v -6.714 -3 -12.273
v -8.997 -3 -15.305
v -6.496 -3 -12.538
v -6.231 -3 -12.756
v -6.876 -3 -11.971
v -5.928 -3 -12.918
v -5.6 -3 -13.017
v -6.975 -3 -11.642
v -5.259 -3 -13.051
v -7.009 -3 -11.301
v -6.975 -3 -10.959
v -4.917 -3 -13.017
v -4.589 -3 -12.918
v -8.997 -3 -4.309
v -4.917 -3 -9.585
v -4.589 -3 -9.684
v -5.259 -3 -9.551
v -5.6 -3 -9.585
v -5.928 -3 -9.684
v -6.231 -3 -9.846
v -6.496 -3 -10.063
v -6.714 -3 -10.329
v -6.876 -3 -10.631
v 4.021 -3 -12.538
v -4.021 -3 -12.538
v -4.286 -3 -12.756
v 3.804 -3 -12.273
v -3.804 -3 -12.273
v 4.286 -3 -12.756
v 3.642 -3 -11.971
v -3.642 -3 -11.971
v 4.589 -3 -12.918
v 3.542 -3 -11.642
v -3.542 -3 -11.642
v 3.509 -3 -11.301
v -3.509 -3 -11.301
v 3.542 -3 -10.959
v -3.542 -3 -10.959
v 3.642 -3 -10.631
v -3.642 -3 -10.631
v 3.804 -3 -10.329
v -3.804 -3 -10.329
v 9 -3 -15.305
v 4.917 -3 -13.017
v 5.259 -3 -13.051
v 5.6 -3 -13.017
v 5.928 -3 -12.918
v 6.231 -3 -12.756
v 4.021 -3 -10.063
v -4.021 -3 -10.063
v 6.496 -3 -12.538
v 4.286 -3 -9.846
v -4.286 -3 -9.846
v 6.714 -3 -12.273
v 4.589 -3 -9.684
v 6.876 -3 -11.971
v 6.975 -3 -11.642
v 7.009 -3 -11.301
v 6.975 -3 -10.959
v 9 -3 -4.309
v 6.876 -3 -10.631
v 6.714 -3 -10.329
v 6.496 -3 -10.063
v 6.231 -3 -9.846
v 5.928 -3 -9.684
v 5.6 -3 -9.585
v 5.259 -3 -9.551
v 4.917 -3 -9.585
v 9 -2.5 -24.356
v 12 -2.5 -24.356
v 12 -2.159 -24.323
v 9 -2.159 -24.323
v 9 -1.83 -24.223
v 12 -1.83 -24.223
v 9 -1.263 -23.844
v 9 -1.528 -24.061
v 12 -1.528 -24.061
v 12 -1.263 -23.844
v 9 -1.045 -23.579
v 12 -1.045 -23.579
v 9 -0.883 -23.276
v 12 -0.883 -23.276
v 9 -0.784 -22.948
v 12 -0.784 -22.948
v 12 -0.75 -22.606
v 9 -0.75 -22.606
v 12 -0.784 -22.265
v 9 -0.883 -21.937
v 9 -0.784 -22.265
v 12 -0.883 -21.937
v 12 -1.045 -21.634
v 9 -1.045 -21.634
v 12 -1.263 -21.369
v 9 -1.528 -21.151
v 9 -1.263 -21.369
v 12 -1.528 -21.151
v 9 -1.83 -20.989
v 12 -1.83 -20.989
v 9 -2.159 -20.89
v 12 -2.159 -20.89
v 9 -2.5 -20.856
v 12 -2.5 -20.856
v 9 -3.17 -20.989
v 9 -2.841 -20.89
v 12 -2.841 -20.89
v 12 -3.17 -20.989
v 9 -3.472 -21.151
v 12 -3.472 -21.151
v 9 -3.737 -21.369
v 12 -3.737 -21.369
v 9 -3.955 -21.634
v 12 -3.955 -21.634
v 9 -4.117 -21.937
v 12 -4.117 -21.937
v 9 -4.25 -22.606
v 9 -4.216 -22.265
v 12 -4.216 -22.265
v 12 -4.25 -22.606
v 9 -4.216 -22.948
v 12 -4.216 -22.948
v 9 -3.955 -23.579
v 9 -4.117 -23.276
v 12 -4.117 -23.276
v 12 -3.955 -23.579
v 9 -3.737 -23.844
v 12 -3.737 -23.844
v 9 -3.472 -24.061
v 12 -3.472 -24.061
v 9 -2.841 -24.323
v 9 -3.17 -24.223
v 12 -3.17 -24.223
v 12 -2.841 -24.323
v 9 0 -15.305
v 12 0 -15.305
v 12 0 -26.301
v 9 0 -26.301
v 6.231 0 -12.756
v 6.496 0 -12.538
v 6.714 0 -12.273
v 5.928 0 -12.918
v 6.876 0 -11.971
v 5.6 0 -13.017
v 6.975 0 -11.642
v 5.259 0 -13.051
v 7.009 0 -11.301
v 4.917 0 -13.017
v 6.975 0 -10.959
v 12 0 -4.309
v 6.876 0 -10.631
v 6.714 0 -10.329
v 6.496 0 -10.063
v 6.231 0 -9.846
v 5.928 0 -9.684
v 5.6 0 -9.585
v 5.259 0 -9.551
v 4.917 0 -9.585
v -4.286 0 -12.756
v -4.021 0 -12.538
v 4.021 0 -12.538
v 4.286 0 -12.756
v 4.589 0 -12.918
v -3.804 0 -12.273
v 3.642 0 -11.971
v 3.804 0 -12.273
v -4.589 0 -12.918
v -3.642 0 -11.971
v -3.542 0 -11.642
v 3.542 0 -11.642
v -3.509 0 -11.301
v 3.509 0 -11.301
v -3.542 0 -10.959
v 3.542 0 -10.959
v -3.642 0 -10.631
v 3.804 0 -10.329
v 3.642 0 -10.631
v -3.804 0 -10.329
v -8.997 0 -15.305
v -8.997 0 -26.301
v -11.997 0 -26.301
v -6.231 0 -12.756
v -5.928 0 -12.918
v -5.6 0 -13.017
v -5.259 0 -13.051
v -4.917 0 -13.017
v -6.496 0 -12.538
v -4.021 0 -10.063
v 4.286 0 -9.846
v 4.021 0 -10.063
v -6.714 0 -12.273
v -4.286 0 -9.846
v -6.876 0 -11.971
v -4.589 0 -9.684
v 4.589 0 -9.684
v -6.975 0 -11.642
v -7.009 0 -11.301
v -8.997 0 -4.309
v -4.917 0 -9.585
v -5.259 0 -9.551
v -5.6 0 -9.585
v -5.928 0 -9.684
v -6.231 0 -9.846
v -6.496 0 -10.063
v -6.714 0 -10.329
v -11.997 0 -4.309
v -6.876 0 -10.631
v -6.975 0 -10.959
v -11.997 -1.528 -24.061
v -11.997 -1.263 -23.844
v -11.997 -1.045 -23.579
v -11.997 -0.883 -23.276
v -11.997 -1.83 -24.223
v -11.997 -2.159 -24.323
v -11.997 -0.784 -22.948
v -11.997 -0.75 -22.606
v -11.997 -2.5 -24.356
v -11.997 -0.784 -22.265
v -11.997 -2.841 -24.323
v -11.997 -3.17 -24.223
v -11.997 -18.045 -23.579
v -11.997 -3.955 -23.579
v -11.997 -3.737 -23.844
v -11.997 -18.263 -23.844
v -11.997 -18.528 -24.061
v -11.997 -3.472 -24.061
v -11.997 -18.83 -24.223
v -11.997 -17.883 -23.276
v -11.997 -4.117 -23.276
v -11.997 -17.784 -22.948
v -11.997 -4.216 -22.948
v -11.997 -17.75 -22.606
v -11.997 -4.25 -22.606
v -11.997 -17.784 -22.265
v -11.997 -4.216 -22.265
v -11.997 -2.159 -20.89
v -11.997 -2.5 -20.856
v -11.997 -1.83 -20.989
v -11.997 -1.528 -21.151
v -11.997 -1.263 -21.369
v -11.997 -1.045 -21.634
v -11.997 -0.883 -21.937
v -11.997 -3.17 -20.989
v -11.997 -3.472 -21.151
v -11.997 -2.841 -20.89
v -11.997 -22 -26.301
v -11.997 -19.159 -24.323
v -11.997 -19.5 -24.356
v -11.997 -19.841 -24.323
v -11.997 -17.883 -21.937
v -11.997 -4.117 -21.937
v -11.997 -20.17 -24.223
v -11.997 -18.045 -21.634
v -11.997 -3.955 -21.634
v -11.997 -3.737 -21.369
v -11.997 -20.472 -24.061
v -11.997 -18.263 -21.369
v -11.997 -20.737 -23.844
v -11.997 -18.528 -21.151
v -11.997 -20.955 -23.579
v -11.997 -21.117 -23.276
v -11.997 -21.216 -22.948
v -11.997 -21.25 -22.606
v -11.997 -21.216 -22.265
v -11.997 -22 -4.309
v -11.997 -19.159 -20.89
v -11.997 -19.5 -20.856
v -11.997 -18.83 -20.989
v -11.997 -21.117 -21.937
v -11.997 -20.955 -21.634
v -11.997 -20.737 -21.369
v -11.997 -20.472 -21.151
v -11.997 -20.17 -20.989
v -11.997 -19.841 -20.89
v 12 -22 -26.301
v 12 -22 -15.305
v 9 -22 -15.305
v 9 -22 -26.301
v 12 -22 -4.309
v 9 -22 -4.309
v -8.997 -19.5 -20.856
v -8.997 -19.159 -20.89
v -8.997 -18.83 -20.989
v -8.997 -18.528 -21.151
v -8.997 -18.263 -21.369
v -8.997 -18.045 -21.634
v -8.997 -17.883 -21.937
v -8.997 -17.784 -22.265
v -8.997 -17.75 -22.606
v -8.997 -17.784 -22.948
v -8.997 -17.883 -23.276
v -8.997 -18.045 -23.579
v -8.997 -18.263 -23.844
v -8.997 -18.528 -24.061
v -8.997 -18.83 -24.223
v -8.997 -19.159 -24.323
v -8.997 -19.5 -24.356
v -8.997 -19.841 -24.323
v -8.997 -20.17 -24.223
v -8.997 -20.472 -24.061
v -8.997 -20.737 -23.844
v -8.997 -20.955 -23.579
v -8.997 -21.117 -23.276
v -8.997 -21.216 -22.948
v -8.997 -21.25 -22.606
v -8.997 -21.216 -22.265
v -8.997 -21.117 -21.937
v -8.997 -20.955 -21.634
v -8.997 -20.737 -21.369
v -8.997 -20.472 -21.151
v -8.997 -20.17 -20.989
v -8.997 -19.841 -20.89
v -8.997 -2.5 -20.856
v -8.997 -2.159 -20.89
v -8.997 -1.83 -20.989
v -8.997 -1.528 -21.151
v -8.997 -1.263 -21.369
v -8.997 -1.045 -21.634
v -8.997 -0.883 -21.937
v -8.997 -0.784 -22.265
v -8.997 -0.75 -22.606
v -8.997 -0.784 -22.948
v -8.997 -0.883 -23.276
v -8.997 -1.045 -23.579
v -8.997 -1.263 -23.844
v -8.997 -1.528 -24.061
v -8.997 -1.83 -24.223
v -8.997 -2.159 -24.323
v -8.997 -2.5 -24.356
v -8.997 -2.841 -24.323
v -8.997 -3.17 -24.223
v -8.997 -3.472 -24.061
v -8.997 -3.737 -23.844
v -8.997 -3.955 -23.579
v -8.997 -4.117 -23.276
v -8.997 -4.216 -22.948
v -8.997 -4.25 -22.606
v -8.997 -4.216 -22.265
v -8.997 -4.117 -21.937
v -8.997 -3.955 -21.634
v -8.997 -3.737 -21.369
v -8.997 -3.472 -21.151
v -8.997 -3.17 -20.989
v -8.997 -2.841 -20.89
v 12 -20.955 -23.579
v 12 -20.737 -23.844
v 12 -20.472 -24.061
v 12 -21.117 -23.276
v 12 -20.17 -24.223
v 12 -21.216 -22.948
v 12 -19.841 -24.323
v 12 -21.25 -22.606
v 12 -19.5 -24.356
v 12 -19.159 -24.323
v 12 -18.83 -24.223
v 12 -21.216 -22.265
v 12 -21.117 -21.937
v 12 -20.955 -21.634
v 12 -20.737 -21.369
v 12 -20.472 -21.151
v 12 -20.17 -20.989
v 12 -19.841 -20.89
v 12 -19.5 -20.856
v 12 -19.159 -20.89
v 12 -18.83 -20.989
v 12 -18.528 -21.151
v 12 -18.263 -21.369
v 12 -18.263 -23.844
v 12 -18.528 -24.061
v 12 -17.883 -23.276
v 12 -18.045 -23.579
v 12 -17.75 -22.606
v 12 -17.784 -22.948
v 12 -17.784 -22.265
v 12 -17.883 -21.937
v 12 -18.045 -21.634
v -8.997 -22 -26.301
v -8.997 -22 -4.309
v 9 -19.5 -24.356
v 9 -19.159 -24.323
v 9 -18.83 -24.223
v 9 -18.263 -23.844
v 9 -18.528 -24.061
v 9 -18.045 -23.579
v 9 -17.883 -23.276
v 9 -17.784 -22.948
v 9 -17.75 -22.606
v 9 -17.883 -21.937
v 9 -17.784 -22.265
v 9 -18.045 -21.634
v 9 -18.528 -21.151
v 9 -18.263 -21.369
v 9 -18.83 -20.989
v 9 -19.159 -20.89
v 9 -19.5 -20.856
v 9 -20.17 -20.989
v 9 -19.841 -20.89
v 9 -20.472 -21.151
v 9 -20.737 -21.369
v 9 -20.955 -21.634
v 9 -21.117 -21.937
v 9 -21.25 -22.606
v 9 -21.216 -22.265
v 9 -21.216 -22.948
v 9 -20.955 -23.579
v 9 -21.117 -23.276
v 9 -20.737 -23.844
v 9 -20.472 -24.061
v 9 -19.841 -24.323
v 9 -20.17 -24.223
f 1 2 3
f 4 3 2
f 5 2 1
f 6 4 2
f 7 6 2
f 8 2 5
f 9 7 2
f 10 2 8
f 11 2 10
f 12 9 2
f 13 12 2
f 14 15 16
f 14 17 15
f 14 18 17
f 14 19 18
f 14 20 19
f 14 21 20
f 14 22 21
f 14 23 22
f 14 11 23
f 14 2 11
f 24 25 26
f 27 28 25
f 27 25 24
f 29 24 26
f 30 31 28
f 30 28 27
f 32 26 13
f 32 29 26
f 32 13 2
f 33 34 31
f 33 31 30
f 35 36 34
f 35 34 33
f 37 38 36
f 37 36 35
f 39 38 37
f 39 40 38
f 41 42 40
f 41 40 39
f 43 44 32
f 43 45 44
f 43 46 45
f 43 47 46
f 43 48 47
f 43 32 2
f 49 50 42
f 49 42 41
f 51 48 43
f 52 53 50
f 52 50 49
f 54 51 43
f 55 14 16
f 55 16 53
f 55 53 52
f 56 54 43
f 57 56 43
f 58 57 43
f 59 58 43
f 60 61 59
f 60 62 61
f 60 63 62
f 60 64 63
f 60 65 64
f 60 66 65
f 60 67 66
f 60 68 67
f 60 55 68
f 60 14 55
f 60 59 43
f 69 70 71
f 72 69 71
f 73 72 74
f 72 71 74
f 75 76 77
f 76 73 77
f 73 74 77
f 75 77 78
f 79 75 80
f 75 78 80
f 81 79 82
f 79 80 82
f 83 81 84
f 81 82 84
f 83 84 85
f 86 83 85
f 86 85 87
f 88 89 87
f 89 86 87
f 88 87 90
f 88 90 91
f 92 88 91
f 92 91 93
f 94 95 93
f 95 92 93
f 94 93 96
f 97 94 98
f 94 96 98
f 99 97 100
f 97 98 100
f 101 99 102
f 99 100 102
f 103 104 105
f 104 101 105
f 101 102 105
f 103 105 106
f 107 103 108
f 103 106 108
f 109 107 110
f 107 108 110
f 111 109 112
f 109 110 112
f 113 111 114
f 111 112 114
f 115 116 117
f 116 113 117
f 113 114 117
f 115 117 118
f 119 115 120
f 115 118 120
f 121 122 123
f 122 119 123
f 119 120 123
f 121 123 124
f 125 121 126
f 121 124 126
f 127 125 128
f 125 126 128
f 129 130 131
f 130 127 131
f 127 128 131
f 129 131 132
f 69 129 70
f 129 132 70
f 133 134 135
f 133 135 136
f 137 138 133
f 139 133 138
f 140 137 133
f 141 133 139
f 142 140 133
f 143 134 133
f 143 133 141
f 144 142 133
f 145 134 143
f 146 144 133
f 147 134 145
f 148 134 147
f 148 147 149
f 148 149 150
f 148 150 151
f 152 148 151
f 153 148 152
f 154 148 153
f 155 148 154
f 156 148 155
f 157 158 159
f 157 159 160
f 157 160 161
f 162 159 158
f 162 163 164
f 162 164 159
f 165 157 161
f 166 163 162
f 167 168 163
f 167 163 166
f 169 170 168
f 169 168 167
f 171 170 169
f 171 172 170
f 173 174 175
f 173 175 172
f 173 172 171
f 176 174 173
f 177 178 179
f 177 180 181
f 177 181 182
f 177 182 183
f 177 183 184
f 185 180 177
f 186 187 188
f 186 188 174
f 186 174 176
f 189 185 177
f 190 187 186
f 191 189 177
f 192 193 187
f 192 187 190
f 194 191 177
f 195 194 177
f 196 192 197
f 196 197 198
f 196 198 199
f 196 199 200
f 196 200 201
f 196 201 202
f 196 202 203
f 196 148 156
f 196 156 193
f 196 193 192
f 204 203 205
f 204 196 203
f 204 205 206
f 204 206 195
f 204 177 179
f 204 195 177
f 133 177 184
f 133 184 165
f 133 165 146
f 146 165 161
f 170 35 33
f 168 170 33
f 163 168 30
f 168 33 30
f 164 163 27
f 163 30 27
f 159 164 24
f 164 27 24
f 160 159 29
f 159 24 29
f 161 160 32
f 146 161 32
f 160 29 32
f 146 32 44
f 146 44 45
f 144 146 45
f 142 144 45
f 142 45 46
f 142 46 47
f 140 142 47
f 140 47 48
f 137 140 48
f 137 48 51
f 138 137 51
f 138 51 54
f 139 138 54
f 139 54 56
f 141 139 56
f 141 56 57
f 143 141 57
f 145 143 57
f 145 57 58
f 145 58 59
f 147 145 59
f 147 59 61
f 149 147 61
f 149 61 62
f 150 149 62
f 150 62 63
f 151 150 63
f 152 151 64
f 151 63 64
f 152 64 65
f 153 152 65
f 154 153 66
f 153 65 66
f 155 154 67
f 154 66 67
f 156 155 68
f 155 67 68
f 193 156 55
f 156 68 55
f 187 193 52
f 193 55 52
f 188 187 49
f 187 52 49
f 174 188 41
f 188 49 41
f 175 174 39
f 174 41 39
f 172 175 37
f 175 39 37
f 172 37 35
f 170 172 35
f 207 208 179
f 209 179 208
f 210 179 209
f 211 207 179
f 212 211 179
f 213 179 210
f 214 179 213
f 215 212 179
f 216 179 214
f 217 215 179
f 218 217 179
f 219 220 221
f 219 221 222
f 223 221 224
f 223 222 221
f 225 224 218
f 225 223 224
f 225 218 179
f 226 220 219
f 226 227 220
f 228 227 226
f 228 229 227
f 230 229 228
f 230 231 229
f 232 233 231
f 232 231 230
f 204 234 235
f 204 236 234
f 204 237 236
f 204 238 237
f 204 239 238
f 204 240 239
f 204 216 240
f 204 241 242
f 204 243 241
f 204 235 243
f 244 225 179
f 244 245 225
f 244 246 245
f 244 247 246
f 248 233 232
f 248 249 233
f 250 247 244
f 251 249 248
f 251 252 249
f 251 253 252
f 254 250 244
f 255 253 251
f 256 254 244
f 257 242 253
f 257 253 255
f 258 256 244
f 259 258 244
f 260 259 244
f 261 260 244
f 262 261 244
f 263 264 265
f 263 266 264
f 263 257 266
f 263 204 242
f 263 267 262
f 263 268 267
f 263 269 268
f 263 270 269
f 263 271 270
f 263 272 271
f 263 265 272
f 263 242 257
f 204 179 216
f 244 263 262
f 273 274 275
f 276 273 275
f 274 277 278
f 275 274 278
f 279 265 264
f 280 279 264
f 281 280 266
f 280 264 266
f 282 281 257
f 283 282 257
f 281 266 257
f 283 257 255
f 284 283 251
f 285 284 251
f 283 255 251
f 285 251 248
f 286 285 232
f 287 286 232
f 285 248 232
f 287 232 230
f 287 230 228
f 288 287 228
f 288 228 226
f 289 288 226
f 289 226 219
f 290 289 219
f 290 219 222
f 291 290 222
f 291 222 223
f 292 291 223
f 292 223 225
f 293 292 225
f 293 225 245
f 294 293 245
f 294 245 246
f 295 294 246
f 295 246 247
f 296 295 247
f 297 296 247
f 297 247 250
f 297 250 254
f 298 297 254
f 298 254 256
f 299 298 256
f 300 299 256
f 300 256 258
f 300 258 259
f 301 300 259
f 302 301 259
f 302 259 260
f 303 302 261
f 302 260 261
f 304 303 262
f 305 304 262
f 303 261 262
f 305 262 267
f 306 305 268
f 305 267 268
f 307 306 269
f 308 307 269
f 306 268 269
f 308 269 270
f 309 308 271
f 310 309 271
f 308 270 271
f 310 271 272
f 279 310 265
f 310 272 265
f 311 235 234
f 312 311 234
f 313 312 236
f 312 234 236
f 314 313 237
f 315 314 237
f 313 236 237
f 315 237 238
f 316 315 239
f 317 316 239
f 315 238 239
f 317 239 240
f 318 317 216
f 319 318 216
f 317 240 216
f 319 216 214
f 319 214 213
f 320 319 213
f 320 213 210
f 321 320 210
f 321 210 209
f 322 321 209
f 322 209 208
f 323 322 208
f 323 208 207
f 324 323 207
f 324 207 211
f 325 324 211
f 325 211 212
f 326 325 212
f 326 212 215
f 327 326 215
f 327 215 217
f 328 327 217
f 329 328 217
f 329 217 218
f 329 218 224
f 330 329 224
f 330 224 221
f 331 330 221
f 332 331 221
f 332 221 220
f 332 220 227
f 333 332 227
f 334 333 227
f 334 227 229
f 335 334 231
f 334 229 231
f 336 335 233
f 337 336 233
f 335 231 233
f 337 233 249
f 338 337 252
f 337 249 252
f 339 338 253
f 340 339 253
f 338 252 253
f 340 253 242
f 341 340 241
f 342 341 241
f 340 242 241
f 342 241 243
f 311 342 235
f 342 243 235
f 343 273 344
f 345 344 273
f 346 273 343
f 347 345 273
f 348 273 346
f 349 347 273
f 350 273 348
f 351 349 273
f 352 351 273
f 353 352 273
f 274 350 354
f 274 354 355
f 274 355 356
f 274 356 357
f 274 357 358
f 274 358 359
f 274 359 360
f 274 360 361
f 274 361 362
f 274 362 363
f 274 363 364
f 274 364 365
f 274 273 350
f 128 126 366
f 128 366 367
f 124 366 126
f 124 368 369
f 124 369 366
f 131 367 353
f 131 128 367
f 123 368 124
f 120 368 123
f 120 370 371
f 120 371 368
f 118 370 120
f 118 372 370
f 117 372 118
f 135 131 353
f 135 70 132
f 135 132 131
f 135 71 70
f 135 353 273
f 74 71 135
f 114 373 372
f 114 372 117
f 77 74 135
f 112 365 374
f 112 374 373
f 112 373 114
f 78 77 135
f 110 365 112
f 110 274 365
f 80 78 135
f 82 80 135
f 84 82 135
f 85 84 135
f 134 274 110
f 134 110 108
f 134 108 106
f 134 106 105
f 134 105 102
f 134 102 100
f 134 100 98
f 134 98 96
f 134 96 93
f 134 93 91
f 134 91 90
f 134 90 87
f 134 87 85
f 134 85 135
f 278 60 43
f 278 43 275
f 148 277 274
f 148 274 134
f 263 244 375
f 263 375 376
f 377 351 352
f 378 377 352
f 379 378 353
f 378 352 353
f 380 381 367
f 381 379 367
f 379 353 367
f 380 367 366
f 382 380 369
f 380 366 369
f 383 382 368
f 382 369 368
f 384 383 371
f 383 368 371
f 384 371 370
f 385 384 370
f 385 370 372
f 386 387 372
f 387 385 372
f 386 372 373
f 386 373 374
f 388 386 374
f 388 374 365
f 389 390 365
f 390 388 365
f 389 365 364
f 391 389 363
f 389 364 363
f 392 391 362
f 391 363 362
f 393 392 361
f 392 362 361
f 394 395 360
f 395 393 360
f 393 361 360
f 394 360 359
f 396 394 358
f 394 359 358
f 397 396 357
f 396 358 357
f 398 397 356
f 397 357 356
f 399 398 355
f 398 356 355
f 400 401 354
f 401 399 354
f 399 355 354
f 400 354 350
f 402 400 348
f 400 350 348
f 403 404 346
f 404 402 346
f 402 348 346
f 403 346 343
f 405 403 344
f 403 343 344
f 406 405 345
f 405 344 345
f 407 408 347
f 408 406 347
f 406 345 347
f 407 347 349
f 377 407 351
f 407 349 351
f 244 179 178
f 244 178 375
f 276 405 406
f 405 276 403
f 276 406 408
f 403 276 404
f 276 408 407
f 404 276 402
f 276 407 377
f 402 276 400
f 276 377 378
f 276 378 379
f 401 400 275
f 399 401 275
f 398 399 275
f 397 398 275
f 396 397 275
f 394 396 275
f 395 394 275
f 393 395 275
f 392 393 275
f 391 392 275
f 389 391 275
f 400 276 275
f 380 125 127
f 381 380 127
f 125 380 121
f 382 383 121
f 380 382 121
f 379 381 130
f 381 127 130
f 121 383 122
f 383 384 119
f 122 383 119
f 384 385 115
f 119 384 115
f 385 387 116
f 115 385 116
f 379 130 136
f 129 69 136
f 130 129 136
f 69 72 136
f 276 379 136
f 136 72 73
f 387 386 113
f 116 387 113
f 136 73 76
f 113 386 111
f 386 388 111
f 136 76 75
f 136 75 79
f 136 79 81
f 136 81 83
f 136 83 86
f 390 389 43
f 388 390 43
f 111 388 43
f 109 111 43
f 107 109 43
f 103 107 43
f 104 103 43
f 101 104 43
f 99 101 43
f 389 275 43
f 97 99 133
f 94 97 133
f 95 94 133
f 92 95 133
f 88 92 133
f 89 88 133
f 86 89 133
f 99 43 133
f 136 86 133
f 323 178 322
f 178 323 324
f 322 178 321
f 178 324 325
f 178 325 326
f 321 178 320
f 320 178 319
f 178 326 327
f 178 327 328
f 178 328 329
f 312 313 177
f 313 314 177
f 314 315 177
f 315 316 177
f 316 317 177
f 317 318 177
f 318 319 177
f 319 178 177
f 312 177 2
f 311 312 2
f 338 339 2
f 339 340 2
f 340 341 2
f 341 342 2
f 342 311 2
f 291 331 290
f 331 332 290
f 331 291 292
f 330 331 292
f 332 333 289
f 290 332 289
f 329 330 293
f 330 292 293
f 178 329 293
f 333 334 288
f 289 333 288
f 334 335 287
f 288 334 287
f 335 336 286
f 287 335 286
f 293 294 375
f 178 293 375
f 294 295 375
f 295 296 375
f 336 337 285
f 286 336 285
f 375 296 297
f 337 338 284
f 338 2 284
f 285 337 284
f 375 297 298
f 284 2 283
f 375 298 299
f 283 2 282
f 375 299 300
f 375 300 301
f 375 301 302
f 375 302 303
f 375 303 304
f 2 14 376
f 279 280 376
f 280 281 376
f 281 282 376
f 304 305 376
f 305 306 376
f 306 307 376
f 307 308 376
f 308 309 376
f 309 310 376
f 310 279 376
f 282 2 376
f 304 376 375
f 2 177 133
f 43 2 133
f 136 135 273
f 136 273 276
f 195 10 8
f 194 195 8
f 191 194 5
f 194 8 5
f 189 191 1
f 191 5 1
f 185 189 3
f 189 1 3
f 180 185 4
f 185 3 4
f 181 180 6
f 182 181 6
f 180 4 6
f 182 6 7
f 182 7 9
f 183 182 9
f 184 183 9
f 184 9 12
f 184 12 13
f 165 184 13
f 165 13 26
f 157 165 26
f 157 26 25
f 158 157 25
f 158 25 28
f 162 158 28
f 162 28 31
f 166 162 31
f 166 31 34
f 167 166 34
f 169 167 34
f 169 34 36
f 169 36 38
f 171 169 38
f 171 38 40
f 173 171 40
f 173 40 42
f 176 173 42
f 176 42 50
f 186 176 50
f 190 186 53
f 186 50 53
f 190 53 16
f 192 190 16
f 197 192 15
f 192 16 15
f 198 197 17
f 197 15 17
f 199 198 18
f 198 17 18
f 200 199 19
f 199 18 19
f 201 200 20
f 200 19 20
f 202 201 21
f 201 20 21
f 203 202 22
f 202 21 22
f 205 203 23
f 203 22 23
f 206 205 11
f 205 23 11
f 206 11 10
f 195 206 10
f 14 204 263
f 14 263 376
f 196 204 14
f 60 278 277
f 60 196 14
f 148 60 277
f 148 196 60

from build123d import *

# Parameters (mm, degrees)
SKETCH_1_W                  = 22
SKETCH_1_H                  = 21.992162459
EXTRUDE_1_DEPTH             = 2.999999998
EXTRUDE_2_DEPTH             = 10.99608123
SKETCH_3_W                  = 3
SKETCH_3_H                  = 22
EXTRUDE_3_DEPTH             = 10.996081229
HOLE_WIZARD_3_5_3_5_1_D     = 3.5
HOLE_WIZARD_3_5_3_5_1_DEPTH = 22.000025
HOLE_WIZARD_3_5_3_5_2_D     = 3.5
HOLE_WIZARD_3_5_3_5_2_DEPTH = 3
HOLE_WIZARD_3_5_3_5_3_D     = 3.5


with BuildPart() as part:
    # 스케치1 → 보스-돌출1 (new body)
    with BuildSketch(Plane(origin=(-11.99726579, 0, 0), x_dir=(0, -1, 0), z_dir=(-1, 0, 0))):
        with Locations((11, -15.30483348)):
            Rectangle(SKETCH_1_W, SKETCH_1_H)
    extrude(amount=-EXTRUDE_1_DEPTH)

    # 스케치2 → 보스-돌출2 (add)
    with BuildSketch(Plane.XY.offset(-4.30875225)):
        Polygon((12, 0), (-8.99726579, 0), (-8.99726579, -2.999999996), (9, -2.999999996), (9, -21.999999998), (12, -21.999999998), align=None)
    extrude(amount=-EXTRUDE_2_DEPTH)

    # 스케치3 → 보스-돌출3 (add)
    with BuildSketch(Plane(origin=(0, 0, -15.30483348), x_dir=(-1.0, 0, 5.95310697820905e-12), z_dir=(-5.95310697820905e-12, 0, -1.0))):
        with Locations((-10.5, -11)):
            Rectangle(SKETCH_3_W, SKETCH_3_H)
    extrude(amount=EXTRUDE_3_DEPTH)

    # Ø3.5 (3.5) 지름 구멍1
    with Locations(Plane(origin=(0, 0, 0), x_dir=(1, 0, 0), z_dir=(0, 1, 0))):
        with Locations((-5.258745872, 11.300890987), (5.258745872, 11.300890987)):
            Hole(HOLE_WIZARD_3_5_3_5_1_D / 2, depth=HOLE_WIZARD_3_5_3_5_1_DEPTH)

    # Ø3.5 (3.5) 지름 구멍2
    with Locations(Plane.ZY.offset(-9)):
        with Locations((-22.606276953, -19.5), (-22.606276953, -2.5)):
            Hole(HOLE_WIZARD_3_5_3_5_2_D / 2, depth=HOLE_WIZARD_3_5_3_5_2_DEPTH)

    # Ø3.5 (3.5) 지름 구멍3 (through all)
    with Locations(Plane(origin=(-8.997265792, 0, 0), x_dir=(0, 0, -1), z_dir=(1, 0, 0))):
        with Locations((22.606276953, -19.5), (22.606276953, -2.5)):
            Hole(HOLE_WIZARD_3_5_3_5_3_D / 2)


solid = part.part
